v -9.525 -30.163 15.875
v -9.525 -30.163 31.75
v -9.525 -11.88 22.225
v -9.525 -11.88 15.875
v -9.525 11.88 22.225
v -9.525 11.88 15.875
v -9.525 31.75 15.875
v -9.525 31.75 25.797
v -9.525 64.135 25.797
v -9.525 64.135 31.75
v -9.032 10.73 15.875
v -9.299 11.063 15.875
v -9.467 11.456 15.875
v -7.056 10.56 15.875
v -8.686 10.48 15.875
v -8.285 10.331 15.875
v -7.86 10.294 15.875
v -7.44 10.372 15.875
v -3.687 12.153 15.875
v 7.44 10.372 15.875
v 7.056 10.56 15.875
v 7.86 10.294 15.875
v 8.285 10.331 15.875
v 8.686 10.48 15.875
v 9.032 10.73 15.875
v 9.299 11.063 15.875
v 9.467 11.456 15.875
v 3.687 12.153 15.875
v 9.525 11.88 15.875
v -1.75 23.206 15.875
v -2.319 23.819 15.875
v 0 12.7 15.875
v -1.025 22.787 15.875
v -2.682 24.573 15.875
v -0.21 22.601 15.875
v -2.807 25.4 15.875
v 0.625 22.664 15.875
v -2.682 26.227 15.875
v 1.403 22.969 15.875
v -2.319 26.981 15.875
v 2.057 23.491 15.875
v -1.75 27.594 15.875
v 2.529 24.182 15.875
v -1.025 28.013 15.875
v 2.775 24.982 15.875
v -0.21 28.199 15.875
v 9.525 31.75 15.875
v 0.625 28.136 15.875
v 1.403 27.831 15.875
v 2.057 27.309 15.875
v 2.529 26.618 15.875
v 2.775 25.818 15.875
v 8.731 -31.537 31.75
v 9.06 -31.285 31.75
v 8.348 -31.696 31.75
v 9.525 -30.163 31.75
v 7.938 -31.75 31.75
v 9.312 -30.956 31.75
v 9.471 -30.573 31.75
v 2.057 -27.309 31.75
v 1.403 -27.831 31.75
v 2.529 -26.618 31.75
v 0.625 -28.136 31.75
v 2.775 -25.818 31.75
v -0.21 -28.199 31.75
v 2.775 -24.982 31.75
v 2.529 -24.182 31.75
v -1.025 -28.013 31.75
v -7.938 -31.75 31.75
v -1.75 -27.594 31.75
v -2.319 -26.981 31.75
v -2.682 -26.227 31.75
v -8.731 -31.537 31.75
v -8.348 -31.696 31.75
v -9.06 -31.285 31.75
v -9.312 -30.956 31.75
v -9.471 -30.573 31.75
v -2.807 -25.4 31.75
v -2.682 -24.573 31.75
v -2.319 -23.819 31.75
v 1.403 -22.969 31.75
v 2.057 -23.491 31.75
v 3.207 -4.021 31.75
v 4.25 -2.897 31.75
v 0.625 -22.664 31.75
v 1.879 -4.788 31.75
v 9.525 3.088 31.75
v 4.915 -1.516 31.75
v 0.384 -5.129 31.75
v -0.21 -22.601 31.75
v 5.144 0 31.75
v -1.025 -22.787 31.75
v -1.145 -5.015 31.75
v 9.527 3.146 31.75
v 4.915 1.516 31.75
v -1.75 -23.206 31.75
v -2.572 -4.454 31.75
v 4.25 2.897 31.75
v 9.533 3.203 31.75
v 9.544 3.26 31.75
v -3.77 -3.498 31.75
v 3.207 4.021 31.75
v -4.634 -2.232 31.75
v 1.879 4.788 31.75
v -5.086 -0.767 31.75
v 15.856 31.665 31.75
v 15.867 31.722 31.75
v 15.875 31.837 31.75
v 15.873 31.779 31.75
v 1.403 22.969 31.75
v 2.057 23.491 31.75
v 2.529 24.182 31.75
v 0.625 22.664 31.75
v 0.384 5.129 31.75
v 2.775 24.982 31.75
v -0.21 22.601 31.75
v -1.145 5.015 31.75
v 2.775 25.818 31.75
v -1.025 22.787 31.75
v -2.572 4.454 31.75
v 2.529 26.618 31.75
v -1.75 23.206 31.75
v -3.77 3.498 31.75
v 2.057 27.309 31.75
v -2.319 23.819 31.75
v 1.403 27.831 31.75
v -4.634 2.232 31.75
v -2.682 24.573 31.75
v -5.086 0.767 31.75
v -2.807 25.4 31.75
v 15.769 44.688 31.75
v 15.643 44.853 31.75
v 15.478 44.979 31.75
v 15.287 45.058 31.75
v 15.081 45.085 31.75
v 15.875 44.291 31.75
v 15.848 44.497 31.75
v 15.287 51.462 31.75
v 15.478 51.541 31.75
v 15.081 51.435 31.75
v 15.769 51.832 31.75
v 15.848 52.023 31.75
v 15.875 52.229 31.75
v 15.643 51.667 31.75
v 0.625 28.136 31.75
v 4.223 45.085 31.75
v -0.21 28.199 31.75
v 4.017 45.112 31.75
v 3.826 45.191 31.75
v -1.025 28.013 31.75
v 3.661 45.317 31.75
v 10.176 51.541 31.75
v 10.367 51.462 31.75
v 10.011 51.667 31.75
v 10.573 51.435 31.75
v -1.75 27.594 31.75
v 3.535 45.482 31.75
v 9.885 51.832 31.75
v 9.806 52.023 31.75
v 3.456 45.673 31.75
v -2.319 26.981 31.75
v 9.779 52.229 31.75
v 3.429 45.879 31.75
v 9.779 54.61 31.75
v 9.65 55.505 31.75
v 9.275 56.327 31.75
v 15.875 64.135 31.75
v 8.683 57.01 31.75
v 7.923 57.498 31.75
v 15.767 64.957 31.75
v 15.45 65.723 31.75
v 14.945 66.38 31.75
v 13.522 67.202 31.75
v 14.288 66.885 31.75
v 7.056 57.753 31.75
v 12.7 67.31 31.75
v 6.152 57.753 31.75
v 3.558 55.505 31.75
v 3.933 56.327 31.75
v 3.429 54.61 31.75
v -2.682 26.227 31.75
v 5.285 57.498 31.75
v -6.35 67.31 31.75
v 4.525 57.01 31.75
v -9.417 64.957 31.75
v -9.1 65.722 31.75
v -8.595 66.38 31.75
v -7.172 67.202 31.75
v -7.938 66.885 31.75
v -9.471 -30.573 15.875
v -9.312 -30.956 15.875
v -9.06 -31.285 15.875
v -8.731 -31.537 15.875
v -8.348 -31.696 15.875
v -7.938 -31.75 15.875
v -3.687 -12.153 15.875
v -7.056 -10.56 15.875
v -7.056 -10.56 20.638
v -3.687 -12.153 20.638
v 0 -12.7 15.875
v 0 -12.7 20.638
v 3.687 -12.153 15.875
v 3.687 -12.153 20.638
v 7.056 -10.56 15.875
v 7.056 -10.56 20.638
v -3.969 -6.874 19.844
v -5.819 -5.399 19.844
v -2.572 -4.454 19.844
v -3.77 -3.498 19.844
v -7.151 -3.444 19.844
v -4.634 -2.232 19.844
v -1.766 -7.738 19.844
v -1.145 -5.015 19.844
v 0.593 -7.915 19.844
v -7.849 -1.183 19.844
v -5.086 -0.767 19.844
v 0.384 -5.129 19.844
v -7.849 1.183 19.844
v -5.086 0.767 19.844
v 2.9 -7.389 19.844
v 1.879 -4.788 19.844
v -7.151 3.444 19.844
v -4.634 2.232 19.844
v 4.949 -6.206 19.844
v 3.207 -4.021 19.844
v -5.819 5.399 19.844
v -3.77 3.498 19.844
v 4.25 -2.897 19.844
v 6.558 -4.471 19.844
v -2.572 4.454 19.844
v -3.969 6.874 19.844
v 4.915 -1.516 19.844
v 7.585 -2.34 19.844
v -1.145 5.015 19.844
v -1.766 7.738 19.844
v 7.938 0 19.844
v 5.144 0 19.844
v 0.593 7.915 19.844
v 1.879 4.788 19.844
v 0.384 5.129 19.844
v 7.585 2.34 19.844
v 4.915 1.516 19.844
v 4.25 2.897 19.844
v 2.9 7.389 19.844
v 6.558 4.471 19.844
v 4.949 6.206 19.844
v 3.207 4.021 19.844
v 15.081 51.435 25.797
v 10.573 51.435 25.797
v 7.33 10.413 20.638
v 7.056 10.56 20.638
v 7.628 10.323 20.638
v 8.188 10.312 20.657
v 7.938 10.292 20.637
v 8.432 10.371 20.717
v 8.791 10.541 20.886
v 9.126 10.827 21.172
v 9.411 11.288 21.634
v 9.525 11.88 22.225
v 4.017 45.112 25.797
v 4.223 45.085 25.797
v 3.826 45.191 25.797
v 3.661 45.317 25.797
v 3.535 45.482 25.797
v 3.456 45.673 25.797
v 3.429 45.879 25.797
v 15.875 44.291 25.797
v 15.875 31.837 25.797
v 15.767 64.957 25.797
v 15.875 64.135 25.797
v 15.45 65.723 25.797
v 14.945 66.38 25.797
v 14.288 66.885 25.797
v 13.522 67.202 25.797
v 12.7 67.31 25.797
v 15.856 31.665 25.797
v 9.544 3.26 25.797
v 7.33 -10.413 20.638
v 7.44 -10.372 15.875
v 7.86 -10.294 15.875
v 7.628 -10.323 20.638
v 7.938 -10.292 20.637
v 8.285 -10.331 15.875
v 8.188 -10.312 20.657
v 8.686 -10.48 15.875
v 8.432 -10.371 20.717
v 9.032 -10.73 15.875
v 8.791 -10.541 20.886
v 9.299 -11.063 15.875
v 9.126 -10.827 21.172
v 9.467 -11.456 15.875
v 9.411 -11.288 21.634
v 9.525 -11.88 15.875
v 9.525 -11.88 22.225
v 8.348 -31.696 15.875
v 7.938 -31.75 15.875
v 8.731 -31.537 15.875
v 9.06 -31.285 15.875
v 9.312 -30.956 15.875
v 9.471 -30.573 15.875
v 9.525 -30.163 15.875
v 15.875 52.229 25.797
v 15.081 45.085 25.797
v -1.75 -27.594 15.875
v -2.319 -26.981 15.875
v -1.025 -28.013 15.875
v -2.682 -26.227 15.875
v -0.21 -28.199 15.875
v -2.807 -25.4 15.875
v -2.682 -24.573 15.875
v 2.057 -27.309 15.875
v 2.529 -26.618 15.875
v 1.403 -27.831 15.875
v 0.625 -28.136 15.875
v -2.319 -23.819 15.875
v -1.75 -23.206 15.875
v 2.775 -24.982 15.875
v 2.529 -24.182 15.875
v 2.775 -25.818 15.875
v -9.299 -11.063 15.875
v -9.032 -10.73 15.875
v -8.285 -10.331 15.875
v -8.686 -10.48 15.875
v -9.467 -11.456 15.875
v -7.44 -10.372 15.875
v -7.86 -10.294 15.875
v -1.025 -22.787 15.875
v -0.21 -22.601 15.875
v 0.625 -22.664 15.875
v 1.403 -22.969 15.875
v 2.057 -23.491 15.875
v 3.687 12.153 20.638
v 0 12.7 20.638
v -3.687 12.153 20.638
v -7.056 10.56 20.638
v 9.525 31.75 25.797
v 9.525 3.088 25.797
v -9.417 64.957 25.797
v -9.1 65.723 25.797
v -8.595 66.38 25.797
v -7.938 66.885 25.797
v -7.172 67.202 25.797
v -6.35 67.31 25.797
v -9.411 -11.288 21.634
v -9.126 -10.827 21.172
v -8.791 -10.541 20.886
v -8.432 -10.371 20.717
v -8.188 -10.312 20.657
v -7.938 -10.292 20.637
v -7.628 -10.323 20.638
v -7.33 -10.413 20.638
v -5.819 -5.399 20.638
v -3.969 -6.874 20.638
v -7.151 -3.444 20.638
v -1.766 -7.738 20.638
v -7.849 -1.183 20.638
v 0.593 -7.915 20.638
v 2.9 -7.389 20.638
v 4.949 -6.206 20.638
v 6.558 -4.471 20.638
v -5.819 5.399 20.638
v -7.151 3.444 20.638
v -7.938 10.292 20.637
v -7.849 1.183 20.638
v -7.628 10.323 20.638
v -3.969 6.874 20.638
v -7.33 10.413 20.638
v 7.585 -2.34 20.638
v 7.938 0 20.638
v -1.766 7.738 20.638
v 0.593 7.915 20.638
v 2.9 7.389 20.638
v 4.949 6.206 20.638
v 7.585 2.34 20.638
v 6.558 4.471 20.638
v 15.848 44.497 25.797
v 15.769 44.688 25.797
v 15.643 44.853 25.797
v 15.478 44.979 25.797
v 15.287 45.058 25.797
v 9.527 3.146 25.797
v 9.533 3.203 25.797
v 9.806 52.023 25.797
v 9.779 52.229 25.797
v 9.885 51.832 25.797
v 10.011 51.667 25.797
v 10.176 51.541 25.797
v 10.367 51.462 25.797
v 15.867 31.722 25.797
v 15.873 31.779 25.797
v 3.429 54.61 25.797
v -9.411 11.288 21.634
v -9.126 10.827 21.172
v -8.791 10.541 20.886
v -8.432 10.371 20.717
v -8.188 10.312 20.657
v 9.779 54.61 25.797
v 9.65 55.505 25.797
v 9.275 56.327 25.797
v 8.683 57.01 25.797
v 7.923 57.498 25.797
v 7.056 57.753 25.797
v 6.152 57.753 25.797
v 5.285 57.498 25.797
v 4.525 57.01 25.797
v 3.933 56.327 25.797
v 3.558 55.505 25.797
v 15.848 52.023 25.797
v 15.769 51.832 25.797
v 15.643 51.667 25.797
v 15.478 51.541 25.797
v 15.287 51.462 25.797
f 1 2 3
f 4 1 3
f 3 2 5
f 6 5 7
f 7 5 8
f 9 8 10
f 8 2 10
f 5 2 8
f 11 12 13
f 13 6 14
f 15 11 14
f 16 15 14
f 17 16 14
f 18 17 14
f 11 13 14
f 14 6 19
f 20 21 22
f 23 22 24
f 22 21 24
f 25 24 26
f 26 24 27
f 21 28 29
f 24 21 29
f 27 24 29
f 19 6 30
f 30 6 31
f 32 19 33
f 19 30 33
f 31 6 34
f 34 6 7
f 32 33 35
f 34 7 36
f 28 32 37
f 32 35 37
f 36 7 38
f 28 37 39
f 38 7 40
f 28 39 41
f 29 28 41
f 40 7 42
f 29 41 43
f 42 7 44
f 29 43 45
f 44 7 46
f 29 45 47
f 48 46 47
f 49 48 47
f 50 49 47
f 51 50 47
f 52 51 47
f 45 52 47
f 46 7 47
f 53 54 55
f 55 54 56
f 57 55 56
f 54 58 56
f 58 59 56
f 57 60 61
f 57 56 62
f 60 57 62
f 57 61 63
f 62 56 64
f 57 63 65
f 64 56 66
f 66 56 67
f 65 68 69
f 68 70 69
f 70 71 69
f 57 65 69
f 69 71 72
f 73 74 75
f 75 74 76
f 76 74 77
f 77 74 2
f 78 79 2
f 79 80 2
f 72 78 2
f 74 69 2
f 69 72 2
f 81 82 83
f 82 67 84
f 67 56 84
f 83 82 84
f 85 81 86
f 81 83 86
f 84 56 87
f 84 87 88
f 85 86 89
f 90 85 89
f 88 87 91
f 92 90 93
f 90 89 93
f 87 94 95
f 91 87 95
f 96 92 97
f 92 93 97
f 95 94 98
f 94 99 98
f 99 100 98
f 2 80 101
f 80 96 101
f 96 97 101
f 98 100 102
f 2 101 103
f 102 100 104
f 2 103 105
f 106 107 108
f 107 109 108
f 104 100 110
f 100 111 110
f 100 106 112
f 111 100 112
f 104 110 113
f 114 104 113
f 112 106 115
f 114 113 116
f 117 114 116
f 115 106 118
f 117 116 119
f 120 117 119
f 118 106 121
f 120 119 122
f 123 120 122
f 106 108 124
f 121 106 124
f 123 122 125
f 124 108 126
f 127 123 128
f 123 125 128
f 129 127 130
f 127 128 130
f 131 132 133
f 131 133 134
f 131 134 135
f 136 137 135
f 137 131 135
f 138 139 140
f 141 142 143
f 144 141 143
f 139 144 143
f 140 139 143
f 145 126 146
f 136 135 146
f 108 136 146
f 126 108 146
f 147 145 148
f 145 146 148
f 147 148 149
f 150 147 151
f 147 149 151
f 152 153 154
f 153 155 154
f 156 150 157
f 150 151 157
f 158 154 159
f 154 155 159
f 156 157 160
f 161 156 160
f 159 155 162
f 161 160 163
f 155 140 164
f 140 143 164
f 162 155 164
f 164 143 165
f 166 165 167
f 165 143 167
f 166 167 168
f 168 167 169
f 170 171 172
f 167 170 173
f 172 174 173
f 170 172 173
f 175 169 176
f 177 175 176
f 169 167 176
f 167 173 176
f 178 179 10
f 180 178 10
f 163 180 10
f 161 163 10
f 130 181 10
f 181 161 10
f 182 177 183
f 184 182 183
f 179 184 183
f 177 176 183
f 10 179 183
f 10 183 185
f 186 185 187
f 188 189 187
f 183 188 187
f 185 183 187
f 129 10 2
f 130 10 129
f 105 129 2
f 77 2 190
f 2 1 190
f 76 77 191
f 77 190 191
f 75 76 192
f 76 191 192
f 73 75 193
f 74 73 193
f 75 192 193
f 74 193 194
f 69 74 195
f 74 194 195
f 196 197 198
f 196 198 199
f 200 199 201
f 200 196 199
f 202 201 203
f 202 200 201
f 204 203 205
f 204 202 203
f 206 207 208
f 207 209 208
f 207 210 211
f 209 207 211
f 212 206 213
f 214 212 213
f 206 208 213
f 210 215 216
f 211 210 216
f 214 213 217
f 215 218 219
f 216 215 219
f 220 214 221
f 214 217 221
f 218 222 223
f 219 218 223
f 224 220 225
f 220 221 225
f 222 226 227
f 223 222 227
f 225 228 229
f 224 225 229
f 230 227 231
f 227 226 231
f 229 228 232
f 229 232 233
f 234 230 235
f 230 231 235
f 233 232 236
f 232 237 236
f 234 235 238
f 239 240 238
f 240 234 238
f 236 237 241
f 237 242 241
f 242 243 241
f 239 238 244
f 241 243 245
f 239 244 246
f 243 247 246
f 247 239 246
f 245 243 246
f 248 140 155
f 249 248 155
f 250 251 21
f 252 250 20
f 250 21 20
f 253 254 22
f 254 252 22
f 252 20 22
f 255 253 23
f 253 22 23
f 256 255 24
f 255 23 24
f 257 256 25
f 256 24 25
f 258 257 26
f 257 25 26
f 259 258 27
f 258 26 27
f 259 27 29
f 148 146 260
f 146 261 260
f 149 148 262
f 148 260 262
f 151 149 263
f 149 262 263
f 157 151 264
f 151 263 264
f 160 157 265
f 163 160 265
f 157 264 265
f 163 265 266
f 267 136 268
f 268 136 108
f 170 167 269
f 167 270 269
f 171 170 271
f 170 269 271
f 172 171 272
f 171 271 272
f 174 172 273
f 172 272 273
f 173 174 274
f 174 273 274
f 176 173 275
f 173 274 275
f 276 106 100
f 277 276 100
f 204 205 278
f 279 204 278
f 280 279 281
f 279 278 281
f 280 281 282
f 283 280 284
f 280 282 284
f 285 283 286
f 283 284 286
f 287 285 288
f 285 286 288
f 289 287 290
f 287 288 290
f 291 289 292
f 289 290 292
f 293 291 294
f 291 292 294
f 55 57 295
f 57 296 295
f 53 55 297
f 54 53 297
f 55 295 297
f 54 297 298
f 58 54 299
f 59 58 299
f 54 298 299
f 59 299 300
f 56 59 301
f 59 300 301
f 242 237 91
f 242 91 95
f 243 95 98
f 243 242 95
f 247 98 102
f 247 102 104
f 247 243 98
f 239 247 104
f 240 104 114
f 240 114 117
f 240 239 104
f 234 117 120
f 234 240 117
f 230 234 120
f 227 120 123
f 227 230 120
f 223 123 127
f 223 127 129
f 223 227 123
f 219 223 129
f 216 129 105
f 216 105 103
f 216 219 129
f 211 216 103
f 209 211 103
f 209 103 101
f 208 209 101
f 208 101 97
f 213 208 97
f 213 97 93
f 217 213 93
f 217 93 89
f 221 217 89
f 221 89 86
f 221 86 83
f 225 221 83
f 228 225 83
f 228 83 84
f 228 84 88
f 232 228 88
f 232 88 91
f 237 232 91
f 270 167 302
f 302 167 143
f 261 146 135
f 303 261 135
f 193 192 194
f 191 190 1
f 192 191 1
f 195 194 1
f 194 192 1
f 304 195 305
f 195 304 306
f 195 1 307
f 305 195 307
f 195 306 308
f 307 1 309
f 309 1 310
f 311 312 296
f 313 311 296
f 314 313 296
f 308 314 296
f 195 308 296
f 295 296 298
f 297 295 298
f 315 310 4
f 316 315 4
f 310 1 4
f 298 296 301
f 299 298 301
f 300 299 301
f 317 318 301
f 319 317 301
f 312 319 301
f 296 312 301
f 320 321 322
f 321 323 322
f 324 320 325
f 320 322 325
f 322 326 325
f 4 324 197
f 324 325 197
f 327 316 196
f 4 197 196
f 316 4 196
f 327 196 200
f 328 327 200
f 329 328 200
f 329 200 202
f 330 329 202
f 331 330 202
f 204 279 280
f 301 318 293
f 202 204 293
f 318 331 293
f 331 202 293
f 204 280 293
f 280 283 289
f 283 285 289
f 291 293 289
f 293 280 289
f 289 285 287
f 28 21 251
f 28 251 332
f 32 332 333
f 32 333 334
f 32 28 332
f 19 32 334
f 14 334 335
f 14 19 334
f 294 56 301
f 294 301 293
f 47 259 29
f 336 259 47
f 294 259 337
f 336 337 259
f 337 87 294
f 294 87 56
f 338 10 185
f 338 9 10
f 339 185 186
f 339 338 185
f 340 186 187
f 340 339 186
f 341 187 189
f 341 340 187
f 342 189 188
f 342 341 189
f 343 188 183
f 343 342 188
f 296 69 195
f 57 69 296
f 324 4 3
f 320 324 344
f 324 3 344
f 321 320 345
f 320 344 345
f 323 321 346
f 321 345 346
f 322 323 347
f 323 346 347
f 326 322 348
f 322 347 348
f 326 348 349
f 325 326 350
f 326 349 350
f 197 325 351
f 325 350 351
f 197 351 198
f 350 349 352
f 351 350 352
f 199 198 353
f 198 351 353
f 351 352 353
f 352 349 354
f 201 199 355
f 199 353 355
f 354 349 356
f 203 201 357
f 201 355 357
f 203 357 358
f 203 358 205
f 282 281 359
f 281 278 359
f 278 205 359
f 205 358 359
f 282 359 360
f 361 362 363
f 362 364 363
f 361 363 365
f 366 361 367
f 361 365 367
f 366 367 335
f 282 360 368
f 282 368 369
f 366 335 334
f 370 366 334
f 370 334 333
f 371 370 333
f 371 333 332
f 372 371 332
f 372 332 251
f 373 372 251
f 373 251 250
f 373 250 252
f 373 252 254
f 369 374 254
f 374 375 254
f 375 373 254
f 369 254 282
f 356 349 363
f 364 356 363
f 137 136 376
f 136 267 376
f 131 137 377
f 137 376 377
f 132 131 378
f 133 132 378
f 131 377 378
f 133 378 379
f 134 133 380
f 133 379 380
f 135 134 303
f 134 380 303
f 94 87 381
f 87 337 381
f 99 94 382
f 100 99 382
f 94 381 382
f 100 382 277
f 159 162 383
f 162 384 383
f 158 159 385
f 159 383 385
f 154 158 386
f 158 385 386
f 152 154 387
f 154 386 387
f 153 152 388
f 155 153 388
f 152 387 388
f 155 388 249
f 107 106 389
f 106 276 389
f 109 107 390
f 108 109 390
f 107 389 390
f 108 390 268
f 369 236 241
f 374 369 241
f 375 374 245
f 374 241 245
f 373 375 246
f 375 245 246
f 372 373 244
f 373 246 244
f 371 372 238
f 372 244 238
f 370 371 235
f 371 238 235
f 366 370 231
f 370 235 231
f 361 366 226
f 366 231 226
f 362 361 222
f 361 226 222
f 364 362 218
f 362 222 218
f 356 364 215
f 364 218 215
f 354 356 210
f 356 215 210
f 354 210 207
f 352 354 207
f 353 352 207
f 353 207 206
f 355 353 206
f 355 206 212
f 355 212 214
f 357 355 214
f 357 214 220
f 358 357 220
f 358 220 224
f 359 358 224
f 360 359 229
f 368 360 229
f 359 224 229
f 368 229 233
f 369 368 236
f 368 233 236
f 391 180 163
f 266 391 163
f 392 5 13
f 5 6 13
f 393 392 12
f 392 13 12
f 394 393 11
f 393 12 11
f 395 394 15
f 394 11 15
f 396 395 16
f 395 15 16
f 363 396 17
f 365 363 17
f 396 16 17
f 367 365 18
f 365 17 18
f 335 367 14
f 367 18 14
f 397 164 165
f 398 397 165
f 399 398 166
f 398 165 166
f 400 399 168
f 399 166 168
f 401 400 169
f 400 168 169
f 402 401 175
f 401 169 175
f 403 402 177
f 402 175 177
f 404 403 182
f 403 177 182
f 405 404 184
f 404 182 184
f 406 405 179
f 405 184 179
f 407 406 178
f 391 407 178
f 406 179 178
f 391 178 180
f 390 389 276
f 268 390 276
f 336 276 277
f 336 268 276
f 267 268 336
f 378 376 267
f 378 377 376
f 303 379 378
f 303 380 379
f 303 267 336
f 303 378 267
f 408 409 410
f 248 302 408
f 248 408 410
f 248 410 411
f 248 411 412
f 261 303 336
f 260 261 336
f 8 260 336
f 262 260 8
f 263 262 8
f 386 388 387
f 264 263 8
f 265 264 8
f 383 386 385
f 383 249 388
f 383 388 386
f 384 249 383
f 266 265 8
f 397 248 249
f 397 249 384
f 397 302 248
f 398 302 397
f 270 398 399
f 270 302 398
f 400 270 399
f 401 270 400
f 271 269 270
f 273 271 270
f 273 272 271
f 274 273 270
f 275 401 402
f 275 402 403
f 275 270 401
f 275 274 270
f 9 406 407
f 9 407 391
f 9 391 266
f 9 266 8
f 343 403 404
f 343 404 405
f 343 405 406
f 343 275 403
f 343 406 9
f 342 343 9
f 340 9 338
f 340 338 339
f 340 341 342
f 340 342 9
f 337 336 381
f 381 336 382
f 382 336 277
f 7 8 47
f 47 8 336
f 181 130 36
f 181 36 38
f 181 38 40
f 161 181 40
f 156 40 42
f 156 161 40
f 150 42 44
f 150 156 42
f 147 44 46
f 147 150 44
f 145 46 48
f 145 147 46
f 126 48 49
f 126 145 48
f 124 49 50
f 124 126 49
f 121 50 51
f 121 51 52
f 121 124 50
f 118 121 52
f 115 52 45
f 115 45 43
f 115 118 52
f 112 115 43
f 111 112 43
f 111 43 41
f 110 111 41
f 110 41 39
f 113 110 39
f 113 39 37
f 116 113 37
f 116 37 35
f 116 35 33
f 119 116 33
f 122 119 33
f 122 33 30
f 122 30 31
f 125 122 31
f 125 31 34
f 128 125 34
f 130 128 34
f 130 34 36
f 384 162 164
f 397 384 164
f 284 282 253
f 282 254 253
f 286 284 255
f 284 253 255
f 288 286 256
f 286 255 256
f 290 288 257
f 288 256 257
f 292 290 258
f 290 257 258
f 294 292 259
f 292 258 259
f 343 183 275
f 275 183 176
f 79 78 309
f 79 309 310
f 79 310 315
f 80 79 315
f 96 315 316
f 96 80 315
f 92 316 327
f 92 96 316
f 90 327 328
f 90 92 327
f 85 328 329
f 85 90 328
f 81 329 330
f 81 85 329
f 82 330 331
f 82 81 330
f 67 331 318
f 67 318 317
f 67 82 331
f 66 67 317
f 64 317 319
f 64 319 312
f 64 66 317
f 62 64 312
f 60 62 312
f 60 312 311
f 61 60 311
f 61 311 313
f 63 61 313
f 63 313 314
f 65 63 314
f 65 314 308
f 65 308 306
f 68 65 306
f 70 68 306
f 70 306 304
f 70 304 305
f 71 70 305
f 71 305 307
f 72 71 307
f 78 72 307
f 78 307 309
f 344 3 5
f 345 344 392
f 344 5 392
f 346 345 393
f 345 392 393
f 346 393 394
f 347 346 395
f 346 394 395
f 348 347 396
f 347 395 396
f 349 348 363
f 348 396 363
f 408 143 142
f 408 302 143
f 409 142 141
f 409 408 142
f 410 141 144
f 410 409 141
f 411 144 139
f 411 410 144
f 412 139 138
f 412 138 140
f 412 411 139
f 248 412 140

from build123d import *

# Parameters (mm, degrees)
SKETCH1_W                  = 19.05
SKETCH1_H                  = 63.5
BOSS_EXTRUDE1_DEPTH        = 15.875
SKETCH2_R                  = 5.1435
CUT_EXTRUDE1_DEPTH         = 37.753282166
SKETCH3_R                  = 12.7
CUT_EXTRUDE2_DEPTH         = 3.96875
SKETCH4_R                  = 12.7
SKETCH4_R_2                = 7.9375
CUT_EXTRUDE3_DEPTH         = 0.79375
F_10_CLEARANCE_HOLE1_D     = 5.6134
F_10_CLEARANCE_HOLE1_DEPTH = 25.4
F_10_CLEARANCE_HOLE1_TIP   = 1.686435499
FILLET1_R                  = 1.5875
BOSS_EXTRUDE2_DEPTH        = 5.953125
FILLET3_R                  = 0.79375
FILLET4_R                  = 3.175


with BuildPart() as part:
    # Sketch1 → Boss-Extrude1 (new body)
    with BuildSketch(Plane.XY):
        Rectangle(SKETCH1_W, SKETCH1_H)
    extrude(amount=BOSS_EXTRUDE1_DEPTH)

    # Sketch2 → Cut-Extrude1 (cut, through all)
    with BuildSketch(Plane.XY.offset(15.875)):
        Circle(SKETCH2_R)
    extrude(amount=-CUT_EXTRUDE1_DEPTH, mode=Mode.SUBTRACT)

    # Sketch3 → Cut-Extrude2 (cut)
    with BuildSketch(Plane.XY.offset(15.875)):
        Circle(SKETCH3_R)
    extrude(amount=-CUT_EXTRUDE2_DEPTH, mode=Mode.SUBTRACT)

    # Sketch4 → Cut-Extrude3 (cut)
    with BuildSketch(Plane.XY.offset(11.90625)):
        Circle(SKETCH4_R)
        Circle(SKETCH4_R_2, mode=Mode.SUBTRACT)
    extrude(amount=-CUT_EXTRUDE3_DEPTH, mode=Mode.SUBTRACT)

    # #10 Clearance Hole1
    with Locations(Plane.XY.offset(15.875)):
        with Locations((0, 25.4), (0, -25.4)):
            Hole(F_10_CLEARANCE_HOLE1_D / 2, depth=F_10_CLEARANCE_HOLE1_DEPTH)
            with Locations((0, 0, -(F_10_CLEARANCE_HOLE1_DEPTH + F_10_CLEARANCE_HOLE1_TIP / 2))):  # 118° drill point
                Cone(0, F_10_CLEARANCE_HOLE1_D / 2, F_10_CLEARANCE_HOLE1_TIP, mode=Mode.SUBTRACT)

    # Fillet1
    fillet1_edges = [part.edges().sort_by_distance(p)[0] for p in [
        (9.525, -8.400260413, 13.49375),
        (-9.525, -8.400260413, 13.49375),
        (9.525, 8.400260413, 13.49375),
        (-9.525, 8.400260413, 13.49375),
        (-9.525, 0, 11.1125),
        (9.525, 0, 11.1125),
        (9.525, -31.75, 7.9375),
        (-9.525, -31.75, 7.9375),
    ]]
    fillet(fillet1_edges, radius=FILLET1_R - 0.0001)  # a hair under: the kernel refuses the full size

    # Sketch12 → Boss-Extrude2 (add)
    with BuildSketch(Plane(origin=(0, 0, 0), x_dir=(-1, 0, 0), z_dir=(0, 0, -1))):
        with BuildLine():
            Line((-15.875, 67.31), (-15.875, 51.435))
            Line((-15.875, 51.435), (-9.779, 51.435))
            Line((-9.779, 51.435), (-9.779, 54.61))
            ThreePointArc((-9.779, 54.61), (-6.604, 57.785), (-3.429, 54.61))
            Line((-3.429, 54.61), (-3.429, 45.085))
            Line((-3.429, 45.085), (-15.875, 45.085))
            Line((-15.875, 45.085), (-15.875, 31.75))
            Line((-15.875, 31.75), (-9.525, 3.175))
            Line((-9.525, 3.175), (-9.525, 31.75))
            Line((-9.525, 31.75), (9.525, 31.75))
            Line((9.525, 31.75), (9.525, 67.31))
            Line((9.525, 67.31), (-15.875, 67.31))
        make_face()
    extrude(amount=-BOSS_EXTRUDE2_DEPTH)

    # Fillet3
    fillet3_edges = [part.edges().sort_by_distance(p)[0] for p in [
        (9.779, 51.435, 2.9765625),
        (15.875, 51.435, 2.9765625),
        (9.525, 3.175, 2.9765625),
        (15.875, 31.75, 2.9765625),
        (15.875, 45.085, 2.9765625),
        (3.429, 45.085, 2.9765625),
    ]]
    fillet(fillet3_edges, radius=FILLET3_R)

    # Fillet4
    fillet4_edges = [part.edges().sort_by_distance(p)[0] for p in [
        (15.875, 67.31, 2.9765625),
        (-9.525, 67.31, 2.9765625),
    ]]
    fillet(fillet4_edges, radius=FILLET4_R)


with BuildPart() as body_2:
    # Mirror1: mirrored copy
    add(part.part.mirror(Plane.XY.offset(15.875)))


solid = body_2.part
